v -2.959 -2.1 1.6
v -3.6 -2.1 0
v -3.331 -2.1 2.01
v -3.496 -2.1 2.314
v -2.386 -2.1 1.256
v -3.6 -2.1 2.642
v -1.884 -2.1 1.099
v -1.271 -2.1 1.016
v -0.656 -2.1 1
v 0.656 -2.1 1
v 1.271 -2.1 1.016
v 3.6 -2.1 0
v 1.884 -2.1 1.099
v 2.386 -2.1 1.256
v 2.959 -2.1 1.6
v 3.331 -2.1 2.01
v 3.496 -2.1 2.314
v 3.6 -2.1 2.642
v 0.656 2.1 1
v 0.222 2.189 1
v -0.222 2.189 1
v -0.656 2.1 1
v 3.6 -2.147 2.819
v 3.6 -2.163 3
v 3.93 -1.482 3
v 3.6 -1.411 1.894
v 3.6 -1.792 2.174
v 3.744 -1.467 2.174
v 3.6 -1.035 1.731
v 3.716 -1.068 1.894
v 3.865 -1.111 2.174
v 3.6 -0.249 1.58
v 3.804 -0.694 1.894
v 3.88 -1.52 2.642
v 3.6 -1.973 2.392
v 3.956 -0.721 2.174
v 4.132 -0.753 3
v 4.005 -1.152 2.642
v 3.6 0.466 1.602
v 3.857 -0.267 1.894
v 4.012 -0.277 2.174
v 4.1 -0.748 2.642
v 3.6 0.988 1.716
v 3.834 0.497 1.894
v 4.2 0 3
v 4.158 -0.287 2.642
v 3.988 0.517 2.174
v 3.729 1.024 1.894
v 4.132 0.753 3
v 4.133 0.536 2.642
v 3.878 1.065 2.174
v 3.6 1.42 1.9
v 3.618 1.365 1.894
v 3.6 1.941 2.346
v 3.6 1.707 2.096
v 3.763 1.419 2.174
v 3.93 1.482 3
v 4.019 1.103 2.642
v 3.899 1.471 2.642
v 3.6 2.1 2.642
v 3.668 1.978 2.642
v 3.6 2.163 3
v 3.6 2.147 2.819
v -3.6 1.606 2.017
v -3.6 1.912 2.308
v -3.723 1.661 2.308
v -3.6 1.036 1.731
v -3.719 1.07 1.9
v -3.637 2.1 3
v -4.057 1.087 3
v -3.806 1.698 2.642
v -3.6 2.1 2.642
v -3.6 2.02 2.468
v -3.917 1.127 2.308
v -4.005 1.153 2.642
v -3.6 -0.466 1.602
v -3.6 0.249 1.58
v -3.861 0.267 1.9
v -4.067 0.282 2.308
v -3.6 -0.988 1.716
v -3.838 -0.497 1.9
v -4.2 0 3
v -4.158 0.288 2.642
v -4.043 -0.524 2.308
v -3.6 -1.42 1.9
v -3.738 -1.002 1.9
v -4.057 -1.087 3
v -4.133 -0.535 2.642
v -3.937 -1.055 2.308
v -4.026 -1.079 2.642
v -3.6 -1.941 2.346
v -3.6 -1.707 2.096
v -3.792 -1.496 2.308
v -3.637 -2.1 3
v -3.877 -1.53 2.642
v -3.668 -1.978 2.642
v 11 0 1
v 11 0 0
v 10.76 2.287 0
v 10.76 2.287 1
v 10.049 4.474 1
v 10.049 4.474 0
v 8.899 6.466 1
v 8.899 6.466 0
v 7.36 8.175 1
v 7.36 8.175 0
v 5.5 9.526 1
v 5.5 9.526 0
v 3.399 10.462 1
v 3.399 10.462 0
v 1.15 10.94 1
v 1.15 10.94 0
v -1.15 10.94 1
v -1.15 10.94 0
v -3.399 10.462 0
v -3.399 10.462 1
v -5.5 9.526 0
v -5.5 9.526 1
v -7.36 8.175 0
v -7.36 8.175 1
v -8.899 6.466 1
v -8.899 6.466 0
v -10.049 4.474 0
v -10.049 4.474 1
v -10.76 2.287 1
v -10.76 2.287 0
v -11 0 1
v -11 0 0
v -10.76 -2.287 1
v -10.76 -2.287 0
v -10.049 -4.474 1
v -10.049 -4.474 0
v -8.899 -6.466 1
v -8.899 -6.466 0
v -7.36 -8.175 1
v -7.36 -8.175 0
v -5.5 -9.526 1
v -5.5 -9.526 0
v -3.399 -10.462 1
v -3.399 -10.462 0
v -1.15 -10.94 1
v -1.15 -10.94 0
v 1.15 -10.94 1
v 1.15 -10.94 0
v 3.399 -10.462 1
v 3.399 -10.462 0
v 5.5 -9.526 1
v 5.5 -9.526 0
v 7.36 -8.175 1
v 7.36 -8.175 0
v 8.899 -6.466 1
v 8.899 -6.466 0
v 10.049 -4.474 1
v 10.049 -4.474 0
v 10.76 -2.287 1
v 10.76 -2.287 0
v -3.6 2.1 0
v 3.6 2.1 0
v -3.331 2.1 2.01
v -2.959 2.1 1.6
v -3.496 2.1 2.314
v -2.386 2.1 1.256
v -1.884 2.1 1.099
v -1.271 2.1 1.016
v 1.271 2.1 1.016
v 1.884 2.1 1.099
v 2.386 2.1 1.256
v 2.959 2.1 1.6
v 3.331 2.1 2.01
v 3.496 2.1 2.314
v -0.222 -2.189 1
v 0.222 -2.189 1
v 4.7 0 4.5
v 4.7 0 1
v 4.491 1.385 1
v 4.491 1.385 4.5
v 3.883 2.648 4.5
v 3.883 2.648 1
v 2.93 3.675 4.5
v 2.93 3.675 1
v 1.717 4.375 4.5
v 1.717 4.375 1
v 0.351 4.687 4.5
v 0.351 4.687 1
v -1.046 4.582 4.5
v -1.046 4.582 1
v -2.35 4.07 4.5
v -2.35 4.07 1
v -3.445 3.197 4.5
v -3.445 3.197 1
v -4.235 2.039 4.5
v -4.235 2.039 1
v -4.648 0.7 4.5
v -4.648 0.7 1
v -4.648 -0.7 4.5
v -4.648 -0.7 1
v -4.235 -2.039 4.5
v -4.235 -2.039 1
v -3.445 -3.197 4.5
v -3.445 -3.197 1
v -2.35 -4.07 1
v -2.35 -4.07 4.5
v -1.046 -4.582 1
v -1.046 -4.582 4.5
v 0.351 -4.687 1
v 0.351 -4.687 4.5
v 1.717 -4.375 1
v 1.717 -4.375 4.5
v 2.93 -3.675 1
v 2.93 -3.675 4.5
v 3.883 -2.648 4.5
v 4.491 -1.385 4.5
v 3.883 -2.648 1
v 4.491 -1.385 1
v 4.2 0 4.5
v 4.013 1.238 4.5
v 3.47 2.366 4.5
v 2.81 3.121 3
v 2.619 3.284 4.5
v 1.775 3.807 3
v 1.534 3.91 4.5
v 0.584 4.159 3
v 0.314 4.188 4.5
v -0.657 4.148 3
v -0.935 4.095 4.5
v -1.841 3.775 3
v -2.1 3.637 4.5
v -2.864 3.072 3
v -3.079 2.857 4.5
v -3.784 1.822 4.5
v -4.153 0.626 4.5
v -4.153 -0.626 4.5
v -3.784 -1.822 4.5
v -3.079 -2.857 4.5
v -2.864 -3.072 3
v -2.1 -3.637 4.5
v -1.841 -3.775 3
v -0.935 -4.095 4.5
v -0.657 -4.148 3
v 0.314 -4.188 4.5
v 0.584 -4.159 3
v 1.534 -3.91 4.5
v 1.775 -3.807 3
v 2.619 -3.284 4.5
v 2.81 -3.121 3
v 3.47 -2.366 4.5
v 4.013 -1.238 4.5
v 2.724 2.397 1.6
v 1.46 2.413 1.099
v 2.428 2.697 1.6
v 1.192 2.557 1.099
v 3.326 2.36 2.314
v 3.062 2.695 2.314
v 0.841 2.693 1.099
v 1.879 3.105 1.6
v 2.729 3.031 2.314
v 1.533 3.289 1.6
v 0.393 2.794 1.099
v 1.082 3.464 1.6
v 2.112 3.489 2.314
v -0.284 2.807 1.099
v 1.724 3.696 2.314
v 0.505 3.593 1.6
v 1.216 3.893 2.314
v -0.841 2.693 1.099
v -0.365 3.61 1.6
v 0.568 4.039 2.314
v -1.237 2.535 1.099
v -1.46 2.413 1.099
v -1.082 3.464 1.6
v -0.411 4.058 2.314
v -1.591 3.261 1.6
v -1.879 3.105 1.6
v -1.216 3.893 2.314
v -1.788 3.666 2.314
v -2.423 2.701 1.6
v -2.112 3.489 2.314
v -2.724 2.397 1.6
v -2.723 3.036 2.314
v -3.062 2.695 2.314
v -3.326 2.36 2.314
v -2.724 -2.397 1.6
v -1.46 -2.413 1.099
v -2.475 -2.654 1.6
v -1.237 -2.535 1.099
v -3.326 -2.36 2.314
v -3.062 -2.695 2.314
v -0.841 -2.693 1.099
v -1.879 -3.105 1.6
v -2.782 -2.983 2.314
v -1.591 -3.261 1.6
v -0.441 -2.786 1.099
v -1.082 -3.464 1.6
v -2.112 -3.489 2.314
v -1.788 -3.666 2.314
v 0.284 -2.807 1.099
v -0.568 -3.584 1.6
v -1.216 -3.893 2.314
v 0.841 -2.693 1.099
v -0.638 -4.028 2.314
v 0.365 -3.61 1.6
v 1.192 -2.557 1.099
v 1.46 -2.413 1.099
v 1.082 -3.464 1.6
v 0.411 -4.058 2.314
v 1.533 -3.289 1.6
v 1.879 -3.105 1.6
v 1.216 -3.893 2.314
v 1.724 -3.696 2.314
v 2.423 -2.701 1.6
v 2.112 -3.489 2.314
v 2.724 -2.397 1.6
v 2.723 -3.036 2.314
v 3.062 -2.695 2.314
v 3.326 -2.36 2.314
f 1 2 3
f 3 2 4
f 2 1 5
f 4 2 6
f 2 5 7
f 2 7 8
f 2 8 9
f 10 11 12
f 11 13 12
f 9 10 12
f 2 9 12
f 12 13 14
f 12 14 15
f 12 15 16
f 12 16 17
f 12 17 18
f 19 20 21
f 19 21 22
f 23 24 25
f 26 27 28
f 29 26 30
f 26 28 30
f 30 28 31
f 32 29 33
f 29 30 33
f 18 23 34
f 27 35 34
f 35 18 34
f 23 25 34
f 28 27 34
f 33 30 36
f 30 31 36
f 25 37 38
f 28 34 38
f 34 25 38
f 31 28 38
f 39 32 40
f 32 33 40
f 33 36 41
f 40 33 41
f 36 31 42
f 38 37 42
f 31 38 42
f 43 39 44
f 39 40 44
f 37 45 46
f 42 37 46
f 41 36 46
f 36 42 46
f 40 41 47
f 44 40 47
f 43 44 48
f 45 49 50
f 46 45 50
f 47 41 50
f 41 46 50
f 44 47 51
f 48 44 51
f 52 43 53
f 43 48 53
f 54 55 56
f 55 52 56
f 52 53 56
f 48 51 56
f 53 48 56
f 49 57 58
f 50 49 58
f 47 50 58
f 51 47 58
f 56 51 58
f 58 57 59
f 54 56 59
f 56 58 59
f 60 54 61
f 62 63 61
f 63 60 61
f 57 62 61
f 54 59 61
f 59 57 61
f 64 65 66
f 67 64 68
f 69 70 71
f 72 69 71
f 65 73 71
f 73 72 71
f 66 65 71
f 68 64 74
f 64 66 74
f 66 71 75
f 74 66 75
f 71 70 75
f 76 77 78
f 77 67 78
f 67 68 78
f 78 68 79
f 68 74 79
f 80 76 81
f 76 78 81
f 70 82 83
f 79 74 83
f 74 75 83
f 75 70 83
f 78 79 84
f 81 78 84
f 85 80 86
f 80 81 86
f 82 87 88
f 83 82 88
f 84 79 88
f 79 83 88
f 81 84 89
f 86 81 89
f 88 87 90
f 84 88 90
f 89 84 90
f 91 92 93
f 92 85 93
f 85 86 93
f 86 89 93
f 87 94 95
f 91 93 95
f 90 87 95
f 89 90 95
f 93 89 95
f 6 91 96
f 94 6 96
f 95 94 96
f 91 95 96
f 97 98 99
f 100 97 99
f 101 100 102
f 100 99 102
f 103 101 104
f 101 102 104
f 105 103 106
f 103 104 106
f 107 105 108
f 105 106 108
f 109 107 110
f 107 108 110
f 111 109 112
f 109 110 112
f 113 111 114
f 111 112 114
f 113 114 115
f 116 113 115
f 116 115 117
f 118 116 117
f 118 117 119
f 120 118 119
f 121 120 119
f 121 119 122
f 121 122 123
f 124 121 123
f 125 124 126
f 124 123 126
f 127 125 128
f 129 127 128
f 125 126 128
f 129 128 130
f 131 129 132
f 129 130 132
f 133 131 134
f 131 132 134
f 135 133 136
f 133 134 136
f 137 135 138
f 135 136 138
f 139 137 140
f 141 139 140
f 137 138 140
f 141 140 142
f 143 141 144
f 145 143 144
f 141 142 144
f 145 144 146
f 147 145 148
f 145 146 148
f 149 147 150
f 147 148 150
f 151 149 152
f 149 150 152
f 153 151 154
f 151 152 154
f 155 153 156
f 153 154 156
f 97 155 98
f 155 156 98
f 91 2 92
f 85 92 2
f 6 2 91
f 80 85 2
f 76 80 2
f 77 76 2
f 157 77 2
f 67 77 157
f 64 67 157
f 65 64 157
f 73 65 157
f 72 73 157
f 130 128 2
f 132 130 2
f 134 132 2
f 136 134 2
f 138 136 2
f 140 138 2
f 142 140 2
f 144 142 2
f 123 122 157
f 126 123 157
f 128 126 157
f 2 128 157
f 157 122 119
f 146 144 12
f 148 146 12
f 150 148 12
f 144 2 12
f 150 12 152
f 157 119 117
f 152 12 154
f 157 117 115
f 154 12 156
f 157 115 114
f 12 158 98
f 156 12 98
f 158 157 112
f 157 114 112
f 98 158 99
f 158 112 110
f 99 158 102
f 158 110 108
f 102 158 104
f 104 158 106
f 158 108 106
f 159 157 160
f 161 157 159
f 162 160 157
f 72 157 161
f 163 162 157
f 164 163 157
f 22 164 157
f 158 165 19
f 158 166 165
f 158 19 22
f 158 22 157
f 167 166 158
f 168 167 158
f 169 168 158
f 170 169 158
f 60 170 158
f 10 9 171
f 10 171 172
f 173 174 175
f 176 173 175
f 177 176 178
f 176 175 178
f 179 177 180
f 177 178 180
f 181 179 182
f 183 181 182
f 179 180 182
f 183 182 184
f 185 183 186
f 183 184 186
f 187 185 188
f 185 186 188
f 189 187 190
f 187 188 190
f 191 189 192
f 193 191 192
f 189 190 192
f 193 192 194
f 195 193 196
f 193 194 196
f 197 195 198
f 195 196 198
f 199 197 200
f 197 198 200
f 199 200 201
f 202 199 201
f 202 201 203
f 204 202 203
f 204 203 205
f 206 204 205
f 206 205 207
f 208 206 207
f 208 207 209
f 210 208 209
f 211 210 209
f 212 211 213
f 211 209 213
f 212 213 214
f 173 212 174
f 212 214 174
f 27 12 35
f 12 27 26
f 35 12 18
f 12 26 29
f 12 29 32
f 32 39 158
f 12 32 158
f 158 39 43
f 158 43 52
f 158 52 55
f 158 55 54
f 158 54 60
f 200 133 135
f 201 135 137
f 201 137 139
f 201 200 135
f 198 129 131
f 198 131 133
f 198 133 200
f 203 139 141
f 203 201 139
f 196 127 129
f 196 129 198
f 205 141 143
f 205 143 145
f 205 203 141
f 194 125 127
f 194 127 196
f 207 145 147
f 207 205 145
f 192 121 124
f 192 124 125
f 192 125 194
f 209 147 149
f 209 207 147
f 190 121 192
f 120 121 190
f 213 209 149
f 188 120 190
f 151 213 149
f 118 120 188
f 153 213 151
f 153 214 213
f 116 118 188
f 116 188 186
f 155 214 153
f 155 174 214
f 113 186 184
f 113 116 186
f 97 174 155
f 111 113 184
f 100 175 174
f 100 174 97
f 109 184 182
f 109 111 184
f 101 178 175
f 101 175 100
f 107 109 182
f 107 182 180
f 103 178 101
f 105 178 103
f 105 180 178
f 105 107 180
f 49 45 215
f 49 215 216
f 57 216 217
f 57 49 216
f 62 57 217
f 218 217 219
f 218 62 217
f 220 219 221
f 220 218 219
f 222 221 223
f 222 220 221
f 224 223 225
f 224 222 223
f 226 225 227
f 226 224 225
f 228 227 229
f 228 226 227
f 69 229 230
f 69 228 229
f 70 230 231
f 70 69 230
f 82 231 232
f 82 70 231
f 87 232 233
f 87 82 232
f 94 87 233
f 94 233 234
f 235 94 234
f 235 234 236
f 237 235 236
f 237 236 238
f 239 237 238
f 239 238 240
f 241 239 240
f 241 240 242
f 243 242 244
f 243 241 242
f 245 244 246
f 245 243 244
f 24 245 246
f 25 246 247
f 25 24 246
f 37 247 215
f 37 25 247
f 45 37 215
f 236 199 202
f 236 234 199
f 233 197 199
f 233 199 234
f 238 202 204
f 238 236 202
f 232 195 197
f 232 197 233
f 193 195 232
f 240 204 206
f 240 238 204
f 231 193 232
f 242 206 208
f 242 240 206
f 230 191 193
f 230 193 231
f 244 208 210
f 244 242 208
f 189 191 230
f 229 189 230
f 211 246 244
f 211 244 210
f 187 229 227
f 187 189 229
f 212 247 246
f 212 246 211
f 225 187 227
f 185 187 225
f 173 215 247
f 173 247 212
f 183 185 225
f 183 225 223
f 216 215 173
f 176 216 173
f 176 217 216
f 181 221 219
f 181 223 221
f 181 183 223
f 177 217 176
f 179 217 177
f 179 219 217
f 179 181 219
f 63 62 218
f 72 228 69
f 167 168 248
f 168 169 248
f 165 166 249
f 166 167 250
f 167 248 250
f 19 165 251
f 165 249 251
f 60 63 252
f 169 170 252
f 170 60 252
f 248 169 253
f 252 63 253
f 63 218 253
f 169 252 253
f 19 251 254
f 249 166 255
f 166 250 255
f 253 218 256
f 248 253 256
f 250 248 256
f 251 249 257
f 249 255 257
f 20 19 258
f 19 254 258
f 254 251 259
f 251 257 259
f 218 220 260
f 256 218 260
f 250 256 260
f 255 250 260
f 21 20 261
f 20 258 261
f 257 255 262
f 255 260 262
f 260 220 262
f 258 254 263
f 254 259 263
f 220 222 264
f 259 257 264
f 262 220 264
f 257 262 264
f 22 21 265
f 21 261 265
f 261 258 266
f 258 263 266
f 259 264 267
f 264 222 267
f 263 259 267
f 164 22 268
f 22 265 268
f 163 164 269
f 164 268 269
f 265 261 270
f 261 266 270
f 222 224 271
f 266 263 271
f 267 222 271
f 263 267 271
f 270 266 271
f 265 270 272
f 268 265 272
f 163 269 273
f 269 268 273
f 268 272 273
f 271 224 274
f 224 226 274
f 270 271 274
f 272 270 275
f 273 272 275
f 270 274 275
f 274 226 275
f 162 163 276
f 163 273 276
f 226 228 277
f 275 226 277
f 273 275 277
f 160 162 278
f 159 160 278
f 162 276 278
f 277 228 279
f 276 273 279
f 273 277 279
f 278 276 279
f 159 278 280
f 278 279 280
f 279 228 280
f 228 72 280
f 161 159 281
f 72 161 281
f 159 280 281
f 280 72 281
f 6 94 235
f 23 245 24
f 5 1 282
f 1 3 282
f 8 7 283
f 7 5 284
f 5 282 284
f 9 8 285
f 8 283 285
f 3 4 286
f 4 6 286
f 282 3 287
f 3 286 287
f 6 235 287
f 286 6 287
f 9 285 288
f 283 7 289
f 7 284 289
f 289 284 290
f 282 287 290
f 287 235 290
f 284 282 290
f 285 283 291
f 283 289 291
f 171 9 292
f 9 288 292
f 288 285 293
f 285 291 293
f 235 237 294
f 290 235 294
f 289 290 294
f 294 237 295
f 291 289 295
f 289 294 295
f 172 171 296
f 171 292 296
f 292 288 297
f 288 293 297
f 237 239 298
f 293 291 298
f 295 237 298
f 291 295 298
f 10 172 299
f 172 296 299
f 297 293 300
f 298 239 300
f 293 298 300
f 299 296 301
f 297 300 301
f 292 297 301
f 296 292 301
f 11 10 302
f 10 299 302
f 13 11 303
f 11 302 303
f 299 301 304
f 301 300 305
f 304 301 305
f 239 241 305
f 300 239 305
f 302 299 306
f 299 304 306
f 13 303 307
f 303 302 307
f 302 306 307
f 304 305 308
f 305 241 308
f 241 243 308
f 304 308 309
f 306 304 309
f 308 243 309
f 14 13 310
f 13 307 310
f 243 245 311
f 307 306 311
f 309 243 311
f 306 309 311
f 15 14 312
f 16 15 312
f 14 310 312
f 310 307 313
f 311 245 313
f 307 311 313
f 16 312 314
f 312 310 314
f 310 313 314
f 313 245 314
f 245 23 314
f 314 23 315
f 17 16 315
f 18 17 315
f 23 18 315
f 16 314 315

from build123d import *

# Parameters (mm, degrees)
F0_R     = 11
F0_W     = 7.2
F0_H     = 4.2
F1_DEPTH = 1
F2_R     = 4.7
F2_R_2   = 4.2
F3_DEPTH = 3.5


# Not quite as in the source:
# - a fillet or chamfer that OpenCascade refuses, or shapes differently, is made with other operations: its cross-section is extruded or revolved along the edge and cut away or added


with BuildPart() as f1:
    # F0 (on Top) → F1 (new body)
    with BuildSketch(Plane.XY):
        Circle(F0_R)
        Rectangle(F0_W, F0_H, mode=Mode.SUBTRACT)
    extrude(amount=F1_DEPTH)

    # F2 (on face) → F3 (join)
    with BuildSketch(Plane.XY.offset(1)):
        Circle(F2_R)
        Circle(F2_R_2, mode=Mode.SUBTRACT)
    extrude(amount=F3_DEPTH)

    # F4: fillet of radius 2 on 1 edges, made by hand


with BuildPart() as f4_tool2:
    # F4_s3 → F4_t4 (revolve)
    with BuildSketch(Plane.XZ):
        with BuildLine():
            ThreePointArc((2.2, 1), (3.6142135624, 1.5857864376), (4.2, 3))
            Line((4.2, 3), (4.2, 1))
            Line((4.2, 1), (2.2, 1))
        make_face()
    revolve(axis=Axis((0, 0, 1), (0, 0, 1)))

    split(bisect_by=Plane.YZ.offset(3.6), keep=Keep.TOP)


with BuildPart() as f1_1:
    add(f1.part)

    # F4_t1: union F4_tool2
    add(f4_tool2.part)


with BuildPart() as f4_tool7:
    # F4_s8 → F4_t9 (revolve)
    with BuildSketch(Plane.XZ):
        with BuildLine():
            ThreePointArc((2.2, 1), (3.6142135624, 1.5857864376), (4.2, 3))
            Line((4.2, 3), (4.2, 1))
            Line((4.2, 1), (2.2, 1))
        make_face()
    revolve(axis=Axis((0, 0, 1), (0, 0, 1)))

    split(bisect_by=Plane.XZ.offset(-2.1), keep=Keep.BOTTOM)


with BuildPart() as f1_2:
    add(f1_1.part)

    # F4_t6: union F4_tool7
    add(f4_tool7.part)


with BuildPart() as f4_tool12:
    # F4_s13 → F4_t14 (revolve)
    with BuildSketch(Plane.XZ):
        with BuildLine():
            ThreePointArc((2.2, 1), (3.6142135624, 1.5857864376), (4.2, 3))
            Line((4.2, 3), (4.2, 1))
            Line((4.2, 1), (2.2, 1))
        make_face()
    revolve(axis=Axis((0, 0, 1), (0, 0, 1)))

    split(bisect_by=Plane.XZ.offset(2.1), keep=Keep.TOP)


with BuildPart() as f1_3:
    add(f1_2.part)

    # F4_t11: union F4_tool12
    add(f4_tool12.part)


with BuildPart() as f4_tool17:
    # F4_s18 → F4_t19 (revolve)
    with BuildSketch(Plane.XZ):
        with BuildLine():
            ThreePointArc((2.2, 1), (3.6142135624, 1.5857864376), (4.2, 3))
            Line((4.2, 3), (4.2, 1))
            Line((4.2, 1), (2.2, 1))
        make_face()
    revolve(axis=Axis((0, 0, 1), (0, 0, 1)))

    split(bisect_by=Plane.YZ.offset(-3.6), keep=Keep.BOTTOM)


with BuildPart() as f1_4:
    add(f1_3.part)

    # F4_t16: union F4_tool17
    add(f4_tool17.part)


solid = f1_4.part
